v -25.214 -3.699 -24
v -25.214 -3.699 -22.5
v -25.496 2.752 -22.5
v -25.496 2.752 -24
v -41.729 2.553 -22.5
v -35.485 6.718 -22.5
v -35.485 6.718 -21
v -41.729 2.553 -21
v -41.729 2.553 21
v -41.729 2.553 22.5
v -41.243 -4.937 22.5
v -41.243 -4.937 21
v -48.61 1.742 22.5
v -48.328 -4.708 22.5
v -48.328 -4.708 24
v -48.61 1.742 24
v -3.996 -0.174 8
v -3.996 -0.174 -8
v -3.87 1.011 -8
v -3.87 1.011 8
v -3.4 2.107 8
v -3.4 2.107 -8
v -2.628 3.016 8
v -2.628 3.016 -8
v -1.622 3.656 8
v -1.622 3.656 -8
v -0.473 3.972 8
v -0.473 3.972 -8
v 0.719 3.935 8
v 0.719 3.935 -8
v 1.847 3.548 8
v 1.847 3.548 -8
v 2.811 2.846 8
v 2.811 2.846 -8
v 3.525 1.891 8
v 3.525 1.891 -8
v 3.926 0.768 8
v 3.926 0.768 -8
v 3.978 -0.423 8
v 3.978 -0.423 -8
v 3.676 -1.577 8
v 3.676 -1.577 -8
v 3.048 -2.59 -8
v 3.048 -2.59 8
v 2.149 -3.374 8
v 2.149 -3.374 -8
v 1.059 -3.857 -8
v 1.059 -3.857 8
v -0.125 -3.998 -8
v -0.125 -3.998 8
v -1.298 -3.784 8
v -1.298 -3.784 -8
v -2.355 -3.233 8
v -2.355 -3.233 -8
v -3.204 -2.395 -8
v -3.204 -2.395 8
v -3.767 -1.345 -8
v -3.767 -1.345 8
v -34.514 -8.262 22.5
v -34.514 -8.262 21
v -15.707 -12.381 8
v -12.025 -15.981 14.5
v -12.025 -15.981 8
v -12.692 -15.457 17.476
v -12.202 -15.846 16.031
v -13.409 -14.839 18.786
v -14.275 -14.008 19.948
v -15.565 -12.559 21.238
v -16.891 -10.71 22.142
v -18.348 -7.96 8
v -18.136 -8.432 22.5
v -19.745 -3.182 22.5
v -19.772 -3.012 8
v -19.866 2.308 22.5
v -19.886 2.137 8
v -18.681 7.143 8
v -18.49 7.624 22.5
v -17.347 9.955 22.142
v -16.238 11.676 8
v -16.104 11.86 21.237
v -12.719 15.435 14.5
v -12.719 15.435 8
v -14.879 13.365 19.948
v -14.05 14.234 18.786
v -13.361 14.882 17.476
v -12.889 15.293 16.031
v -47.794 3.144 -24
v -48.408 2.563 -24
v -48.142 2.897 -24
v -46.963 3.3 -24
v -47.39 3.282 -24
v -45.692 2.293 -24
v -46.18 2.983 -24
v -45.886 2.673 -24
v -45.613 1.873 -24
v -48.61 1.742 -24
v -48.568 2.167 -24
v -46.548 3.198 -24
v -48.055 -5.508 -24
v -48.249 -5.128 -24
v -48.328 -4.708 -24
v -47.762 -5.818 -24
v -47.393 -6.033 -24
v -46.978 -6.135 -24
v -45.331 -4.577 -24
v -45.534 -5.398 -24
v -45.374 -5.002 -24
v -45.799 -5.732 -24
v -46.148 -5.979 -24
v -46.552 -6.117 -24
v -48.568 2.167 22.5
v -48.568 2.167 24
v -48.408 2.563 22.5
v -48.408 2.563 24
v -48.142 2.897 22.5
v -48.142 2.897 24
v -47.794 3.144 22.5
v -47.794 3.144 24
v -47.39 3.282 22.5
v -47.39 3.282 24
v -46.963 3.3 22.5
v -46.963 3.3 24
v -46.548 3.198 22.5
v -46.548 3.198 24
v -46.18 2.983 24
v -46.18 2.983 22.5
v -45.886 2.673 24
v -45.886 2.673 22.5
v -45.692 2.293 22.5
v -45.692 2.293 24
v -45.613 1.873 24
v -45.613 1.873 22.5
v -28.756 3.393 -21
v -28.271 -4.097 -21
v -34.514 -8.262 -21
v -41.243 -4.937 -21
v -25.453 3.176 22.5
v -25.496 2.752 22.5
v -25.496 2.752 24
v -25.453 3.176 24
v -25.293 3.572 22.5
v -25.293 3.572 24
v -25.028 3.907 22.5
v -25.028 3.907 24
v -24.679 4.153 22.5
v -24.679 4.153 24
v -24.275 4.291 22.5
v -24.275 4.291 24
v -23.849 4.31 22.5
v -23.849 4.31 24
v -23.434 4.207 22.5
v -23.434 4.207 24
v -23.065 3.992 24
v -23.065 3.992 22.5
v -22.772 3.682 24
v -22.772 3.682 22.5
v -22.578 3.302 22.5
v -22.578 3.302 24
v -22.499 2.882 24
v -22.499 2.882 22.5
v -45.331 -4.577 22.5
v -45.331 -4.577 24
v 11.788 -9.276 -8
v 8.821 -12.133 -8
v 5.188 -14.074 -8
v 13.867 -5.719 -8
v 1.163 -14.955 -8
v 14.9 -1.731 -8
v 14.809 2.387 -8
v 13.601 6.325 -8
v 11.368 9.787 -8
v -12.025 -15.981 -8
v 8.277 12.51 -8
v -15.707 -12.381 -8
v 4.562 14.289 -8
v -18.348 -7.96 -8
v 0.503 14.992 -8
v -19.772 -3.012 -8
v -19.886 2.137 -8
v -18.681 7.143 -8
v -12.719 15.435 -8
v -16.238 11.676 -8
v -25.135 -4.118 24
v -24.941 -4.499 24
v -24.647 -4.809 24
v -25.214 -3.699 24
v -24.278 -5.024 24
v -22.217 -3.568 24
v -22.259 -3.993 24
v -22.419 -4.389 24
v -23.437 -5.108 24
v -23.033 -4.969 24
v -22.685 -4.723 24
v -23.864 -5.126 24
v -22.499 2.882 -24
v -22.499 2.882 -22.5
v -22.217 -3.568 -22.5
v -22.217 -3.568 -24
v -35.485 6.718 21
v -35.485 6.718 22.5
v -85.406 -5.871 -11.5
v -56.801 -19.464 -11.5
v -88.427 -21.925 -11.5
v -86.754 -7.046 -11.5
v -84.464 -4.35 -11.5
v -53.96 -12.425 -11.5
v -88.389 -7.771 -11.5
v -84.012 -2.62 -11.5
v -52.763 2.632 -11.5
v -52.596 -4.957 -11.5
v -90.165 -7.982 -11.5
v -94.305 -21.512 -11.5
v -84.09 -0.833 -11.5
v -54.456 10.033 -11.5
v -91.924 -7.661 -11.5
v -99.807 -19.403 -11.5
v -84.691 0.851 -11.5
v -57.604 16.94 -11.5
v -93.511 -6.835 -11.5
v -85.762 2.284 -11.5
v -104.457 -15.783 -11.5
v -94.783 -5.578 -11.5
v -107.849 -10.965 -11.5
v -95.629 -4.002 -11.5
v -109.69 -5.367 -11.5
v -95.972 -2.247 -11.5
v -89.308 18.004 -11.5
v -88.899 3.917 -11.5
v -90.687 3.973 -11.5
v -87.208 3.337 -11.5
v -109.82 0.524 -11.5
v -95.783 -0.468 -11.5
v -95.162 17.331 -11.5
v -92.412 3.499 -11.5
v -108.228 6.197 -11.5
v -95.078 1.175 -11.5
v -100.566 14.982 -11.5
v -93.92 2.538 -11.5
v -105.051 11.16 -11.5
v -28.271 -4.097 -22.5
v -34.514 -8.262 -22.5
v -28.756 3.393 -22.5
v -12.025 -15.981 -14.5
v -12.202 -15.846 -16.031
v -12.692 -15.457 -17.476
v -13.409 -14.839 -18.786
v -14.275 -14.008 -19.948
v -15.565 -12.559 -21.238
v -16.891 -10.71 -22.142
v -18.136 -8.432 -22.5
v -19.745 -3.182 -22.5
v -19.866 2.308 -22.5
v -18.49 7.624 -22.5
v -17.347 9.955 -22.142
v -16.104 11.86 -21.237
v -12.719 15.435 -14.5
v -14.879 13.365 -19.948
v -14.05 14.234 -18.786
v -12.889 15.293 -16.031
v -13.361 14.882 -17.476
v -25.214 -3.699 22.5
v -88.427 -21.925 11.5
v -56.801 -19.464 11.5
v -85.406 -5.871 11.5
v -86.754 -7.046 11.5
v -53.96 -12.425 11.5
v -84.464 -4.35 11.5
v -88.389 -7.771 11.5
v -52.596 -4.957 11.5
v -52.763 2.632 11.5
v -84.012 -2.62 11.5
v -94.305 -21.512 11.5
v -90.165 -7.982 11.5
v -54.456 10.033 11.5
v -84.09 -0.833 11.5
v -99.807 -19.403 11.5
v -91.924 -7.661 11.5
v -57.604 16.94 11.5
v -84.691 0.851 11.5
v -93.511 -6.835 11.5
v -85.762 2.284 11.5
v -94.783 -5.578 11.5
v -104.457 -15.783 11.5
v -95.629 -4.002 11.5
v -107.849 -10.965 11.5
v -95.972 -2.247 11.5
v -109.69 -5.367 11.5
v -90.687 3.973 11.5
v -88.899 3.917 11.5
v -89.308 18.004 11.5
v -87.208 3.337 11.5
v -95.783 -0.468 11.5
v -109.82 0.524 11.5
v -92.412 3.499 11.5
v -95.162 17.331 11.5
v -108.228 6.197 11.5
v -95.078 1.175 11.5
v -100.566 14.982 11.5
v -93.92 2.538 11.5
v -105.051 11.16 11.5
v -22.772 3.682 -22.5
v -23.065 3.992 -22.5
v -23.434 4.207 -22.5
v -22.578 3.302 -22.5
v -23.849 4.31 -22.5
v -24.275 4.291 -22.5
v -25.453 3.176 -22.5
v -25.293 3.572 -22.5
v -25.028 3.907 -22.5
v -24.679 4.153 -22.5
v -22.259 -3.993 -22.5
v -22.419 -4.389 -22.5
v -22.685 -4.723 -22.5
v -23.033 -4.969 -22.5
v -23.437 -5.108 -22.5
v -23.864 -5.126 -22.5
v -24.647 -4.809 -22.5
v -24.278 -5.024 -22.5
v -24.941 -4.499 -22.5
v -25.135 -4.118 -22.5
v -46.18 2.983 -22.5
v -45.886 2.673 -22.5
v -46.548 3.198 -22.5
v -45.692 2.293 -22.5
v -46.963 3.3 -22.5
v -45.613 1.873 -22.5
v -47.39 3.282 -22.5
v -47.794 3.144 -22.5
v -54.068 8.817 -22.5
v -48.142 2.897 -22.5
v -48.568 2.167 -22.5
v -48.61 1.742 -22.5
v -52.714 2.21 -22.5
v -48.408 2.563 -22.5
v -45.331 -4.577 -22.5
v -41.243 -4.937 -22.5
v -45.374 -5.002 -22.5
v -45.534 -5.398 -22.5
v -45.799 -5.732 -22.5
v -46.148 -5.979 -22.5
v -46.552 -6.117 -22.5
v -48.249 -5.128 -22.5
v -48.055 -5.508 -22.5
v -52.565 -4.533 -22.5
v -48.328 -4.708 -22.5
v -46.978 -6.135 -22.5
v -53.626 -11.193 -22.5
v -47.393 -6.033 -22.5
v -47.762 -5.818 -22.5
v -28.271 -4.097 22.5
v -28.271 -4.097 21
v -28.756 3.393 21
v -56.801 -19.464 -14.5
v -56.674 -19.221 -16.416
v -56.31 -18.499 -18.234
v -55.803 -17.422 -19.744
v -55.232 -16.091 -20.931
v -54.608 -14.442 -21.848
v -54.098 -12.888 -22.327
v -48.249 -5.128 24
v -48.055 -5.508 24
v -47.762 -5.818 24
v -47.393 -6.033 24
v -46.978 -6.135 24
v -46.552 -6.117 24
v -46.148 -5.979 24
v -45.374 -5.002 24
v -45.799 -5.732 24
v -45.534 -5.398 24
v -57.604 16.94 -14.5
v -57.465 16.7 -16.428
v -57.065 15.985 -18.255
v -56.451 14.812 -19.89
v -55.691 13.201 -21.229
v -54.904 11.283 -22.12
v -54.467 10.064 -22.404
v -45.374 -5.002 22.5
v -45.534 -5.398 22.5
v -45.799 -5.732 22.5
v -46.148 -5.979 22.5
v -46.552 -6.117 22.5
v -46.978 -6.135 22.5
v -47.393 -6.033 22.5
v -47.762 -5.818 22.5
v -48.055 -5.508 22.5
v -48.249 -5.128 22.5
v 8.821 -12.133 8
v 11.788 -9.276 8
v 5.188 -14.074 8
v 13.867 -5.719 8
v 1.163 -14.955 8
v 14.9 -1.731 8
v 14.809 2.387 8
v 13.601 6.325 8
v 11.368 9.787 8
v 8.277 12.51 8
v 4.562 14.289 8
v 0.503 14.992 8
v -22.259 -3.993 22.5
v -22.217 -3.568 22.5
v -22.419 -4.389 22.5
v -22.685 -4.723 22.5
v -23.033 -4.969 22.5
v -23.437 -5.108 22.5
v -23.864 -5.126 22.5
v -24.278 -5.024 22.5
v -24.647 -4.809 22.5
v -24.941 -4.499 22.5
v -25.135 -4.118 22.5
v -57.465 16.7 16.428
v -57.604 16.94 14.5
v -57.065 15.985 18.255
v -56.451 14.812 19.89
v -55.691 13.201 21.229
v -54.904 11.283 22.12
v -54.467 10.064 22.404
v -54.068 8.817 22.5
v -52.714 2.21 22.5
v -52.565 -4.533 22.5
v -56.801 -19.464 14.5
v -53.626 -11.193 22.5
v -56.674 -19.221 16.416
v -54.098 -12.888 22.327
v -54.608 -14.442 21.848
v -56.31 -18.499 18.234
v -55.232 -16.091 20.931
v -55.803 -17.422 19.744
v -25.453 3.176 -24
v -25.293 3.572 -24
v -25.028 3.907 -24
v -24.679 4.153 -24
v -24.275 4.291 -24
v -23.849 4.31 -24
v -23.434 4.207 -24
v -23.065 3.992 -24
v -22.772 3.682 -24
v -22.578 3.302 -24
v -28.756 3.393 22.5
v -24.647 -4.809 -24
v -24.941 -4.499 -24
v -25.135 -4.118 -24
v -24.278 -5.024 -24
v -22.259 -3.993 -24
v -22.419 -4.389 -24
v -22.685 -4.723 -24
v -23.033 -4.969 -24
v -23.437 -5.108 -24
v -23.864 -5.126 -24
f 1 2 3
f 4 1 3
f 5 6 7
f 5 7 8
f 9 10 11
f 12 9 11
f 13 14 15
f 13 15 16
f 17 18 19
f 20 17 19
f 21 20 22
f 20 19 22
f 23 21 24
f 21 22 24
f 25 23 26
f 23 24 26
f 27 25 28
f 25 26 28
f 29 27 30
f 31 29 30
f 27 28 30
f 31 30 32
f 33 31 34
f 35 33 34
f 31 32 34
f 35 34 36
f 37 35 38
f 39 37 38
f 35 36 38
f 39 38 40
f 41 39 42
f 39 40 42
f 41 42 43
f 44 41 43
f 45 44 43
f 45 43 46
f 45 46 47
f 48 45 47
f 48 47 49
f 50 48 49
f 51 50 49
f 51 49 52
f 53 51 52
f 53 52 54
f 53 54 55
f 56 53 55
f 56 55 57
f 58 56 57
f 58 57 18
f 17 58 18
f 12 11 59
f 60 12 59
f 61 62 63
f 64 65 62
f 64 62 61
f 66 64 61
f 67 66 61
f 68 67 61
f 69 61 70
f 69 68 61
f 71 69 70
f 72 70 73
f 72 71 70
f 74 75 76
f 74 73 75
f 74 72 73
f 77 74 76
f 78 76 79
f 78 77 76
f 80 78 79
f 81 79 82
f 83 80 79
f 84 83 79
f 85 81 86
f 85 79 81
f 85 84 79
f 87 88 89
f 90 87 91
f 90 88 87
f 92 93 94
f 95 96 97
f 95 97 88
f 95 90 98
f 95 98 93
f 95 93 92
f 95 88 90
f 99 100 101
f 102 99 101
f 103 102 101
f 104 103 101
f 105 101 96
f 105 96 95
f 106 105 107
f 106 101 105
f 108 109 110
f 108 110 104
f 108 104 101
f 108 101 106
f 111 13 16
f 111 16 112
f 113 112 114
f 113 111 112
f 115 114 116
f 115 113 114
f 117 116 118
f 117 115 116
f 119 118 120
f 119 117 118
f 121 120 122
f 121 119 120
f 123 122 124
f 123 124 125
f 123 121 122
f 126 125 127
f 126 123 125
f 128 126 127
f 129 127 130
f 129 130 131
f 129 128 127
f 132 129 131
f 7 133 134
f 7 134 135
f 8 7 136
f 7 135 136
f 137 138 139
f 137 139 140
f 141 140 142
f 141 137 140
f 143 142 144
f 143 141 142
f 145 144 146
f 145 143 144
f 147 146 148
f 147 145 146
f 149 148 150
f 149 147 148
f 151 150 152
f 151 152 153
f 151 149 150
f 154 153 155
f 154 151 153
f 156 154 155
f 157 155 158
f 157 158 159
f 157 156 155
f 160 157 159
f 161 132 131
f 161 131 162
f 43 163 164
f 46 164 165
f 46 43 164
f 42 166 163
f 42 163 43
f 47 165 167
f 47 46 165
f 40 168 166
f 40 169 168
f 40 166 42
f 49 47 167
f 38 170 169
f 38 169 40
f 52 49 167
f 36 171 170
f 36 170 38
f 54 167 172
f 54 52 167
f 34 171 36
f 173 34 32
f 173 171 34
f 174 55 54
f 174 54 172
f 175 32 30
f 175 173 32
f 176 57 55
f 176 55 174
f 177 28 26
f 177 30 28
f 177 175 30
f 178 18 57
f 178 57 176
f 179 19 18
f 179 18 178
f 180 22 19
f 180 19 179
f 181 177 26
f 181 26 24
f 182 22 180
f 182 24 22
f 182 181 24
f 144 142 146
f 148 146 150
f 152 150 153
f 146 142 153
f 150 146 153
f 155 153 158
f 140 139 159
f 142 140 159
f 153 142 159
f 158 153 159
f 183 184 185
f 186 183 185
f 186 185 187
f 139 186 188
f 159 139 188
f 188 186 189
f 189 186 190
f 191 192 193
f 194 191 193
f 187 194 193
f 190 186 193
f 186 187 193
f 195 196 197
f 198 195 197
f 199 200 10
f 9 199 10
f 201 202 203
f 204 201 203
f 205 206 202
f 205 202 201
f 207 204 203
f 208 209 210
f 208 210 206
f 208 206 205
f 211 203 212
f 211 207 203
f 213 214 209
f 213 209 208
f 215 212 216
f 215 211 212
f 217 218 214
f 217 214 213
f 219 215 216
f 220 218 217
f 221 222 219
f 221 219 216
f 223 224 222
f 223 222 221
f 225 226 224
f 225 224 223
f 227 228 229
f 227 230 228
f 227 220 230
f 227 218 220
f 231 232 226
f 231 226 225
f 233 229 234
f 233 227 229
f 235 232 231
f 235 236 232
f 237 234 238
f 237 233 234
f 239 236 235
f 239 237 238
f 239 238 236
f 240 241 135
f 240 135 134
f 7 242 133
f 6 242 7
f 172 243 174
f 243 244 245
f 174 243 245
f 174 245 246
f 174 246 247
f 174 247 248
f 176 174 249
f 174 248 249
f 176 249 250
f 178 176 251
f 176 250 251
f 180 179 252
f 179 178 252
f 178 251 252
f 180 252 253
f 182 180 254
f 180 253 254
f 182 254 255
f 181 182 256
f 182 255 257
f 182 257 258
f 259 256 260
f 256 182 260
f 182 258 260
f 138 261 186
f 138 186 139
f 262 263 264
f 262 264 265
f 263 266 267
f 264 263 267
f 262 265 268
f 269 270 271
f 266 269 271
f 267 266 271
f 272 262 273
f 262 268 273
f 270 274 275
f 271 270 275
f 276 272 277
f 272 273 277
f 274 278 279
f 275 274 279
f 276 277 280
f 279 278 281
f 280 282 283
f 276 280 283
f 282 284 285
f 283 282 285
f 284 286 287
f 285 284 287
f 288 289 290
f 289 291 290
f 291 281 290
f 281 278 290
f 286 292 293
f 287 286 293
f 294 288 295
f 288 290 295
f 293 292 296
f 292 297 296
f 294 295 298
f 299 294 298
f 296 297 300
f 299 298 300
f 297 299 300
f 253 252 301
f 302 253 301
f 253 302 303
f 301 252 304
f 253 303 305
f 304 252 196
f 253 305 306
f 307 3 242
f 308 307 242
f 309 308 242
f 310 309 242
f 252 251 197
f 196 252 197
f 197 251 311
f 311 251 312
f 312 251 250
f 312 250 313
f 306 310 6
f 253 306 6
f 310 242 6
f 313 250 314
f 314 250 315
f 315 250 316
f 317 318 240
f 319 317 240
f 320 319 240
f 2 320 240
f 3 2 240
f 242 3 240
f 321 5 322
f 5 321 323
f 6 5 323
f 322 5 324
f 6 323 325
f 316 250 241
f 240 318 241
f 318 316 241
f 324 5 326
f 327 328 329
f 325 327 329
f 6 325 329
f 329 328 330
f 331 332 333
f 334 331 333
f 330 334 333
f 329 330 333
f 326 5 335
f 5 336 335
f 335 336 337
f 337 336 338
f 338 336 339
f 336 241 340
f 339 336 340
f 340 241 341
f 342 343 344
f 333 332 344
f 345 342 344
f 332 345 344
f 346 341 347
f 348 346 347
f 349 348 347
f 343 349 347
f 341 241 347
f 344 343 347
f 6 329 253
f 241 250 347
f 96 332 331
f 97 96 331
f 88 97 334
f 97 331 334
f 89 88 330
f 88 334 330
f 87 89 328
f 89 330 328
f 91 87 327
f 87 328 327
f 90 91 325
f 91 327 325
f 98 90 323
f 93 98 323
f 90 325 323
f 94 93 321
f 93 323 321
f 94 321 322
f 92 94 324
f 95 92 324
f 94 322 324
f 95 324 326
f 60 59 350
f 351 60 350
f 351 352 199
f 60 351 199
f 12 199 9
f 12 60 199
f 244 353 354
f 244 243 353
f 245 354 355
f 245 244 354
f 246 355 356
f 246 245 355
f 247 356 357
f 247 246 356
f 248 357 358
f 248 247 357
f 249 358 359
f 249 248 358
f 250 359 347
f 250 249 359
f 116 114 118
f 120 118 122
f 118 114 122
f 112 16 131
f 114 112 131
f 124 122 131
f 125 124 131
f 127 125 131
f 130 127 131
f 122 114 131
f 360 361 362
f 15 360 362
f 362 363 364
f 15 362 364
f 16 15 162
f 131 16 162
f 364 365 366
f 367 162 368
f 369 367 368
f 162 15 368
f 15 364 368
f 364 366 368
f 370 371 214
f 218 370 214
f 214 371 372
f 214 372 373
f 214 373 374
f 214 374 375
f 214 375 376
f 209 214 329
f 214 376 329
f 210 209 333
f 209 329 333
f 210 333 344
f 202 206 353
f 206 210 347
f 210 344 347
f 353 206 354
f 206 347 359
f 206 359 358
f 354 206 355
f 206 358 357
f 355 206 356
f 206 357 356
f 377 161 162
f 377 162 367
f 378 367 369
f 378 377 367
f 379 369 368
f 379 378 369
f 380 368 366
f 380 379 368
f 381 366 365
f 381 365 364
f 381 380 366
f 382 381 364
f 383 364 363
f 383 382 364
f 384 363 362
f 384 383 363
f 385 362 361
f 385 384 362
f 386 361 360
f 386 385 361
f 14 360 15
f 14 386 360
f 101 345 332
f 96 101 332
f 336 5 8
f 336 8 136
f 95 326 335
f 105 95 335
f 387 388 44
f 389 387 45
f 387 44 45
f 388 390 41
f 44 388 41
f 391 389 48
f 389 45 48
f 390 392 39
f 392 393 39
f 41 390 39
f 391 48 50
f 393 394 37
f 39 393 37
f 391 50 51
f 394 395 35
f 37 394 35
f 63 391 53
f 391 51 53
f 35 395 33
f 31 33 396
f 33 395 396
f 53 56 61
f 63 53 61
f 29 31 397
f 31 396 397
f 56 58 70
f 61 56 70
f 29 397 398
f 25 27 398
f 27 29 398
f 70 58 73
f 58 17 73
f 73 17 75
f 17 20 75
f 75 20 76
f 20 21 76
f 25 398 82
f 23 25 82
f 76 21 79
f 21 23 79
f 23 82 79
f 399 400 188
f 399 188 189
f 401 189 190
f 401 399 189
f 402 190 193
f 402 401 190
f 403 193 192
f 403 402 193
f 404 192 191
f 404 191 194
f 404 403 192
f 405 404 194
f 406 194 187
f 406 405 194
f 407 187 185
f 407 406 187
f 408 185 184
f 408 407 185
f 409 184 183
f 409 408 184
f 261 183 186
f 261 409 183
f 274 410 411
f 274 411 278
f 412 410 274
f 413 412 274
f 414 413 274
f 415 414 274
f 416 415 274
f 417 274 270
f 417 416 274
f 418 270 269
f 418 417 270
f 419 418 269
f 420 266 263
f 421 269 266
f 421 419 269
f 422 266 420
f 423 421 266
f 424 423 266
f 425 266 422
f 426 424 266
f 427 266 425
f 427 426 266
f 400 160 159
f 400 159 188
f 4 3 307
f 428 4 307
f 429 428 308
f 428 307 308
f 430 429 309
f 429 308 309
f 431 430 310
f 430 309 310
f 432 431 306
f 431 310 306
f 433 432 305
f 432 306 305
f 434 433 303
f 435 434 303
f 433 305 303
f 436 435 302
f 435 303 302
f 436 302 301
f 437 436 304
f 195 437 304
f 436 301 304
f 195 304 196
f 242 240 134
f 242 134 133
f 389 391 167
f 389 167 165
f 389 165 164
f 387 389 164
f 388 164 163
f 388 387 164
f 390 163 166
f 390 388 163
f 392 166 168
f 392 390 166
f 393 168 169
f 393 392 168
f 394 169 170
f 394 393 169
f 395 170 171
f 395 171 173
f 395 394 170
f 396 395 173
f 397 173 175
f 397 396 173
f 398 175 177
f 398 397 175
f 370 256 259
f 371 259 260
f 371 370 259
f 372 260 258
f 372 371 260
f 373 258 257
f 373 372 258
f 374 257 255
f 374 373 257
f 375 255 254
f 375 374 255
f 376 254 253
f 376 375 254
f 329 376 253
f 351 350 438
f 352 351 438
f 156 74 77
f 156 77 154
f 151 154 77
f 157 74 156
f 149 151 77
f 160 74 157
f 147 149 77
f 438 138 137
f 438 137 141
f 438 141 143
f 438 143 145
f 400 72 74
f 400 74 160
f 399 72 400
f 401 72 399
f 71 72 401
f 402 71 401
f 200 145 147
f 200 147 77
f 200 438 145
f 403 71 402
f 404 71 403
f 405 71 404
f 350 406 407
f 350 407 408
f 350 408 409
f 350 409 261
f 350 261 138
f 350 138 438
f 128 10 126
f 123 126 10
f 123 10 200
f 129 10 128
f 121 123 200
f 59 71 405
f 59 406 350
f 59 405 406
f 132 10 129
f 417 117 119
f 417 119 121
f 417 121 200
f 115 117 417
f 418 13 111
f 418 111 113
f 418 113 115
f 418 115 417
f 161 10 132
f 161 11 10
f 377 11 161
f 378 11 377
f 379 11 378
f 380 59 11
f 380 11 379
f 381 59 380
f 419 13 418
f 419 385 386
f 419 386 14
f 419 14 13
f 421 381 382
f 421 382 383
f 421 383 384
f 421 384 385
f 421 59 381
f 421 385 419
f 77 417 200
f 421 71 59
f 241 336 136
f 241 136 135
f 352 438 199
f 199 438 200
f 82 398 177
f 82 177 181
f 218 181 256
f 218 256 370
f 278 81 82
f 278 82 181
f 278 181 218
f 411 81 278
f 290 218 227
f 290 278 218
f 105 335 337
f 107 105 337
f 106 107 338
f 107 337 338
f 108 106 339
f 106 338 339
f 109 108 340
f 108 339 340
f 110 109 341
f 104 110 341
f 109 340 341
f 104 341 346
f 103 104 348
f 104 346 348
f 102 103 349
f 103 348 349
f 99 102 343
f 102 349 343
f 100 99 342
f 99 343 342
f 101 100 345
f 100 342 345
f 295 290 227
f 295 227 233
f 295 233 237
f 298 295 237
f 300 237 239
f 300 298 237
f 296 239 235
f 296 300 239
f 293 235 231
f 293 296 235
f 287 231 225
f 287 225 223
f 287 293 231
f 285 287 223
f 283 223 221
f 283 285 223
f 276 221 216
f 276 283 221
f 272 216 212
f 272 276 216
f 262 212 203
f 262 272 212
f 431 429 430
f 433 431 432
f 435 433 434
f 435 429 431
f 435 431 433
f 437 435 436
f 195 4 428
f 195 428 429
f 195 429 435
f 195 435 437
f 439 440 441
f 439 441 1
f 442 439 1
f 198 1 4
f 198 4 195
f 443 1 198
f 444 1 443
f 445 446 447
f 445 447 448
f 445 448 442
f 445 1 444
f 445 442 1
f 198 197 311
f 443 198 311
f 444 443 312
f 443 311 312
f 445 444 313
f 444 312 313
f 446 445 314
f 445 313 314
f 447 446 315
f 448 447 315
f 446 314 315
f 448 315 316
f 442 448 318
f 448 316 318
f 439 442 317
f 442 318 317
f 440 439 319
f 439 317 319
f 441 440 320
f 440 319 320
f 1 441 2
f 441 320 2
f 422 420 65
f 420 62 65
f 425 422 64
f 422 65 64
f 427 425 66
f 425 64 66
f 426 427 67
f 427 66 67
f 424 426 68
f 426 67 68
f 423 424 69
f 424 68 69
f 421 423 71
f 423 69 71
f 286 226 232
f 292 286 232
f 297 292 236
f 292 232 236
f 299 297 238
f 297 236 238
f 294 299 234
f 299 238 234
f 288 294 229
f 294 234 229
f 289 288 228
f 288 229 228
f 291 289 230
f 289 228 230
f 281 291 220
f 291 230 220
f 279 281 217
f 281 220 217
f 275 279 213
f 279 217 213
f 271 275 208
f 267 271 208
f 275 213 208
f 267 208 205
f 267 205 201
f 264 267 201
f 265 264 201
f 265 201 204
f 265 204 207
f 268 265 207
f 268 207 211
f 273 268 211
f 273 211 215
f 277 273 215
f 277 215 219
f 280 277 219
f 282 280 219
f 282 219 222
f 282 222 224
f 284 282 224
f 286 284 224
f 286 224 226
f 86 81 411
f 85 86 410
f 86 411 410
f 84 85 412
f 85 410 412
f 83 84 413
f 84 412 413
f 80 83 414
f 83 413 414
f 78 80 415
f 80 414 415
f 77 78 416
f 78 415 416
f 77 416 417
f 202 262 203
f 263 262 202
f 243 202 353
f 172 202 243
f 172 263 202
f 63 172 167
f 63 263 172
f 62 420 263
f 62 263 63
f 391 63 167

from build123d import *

# Parameters (mm, degrees)
BOSS_EXTRUDE1_DEPTH    = 22.5
SKETCH2_R              = 37.5
SKETCH2_R_2            = 20
CUT_EXTRUDE1_DEPTH     = 11
FILLET1_R              = 8
SKETCH4_R              = 6
SKETCH4_R_2            = 4
CUT_EXTRUDE2_DEPTH     = 40
CUT_EXTRUDE3_DEPTH     = 1.5
BOSS_EXTRUDE2_DEPTH    = 1.5
SKETCH7_R              = 20
CUT_EXTRUDE4_DEPTH     = 3.5
BODY_MOVE_COPY7_ANGLE  = 178.232303169
BODY_MOVE_COPY8_ANGLE  = 1.26
BODY_MOVE_COPY9_ANGLE  = 1.26
BODY_MOVE_COPY10_ANGLE = 180


with BuildPart() as part:
    # Sketch1 → Boss-Extrude1 (new body, symmetric)
    with BuildSketch(Plane(origin=(0, 0, 0), x_dir=(1, 0, 0), z_dir=(0, 1, 0))):
        with BuildLine():
            Line((-91.135271219, -13.013928685), (-1.541618241, -19.940496814))
            ThreePointArc((-1.541618241, -19.940496814), (19.99534612, -0.431431984), (-0.680086883, 19.988433701))
            Line((-0.680086883, 19.988433701), (-90.489122701, 16.932769202))
            ThreePointArc((-90.489122701, 16.932769202), (-104.975567128, 2.265017913), (-91.135271219, -13.013928685))
        make_face()
    extrude(amount=BOSS_EXTRUDE1_DEPTH, both=True)

    # Sketch2 → Cut-Extrude1 (cut)
    with BuildSketch(Plane.XZ.offset(22.5)):
        Circle(SKETCH2_R)
        with Locations((-89.979057538, -1.941443926)):
            Circle(SKETCH2_R_2)
    cut_extrude1 = extrude(amount=-CUT_EXTRUDE1_DEPTH, mode=Mode.SUBTRACT)

    # Mirror1: Cut-Extrude1 across plane
    add(cut_extrude1.mirror(Plane(origin=(0, 0, 0), x_dir=(0, 0, 1), z_dir=(0, -1, 0))), mode=Mode.SUBTRACT)

    # Fillet1
    fillet1_edges = [part.edges().sort_by_distance(p)[0] for p in [
        (-55.557279033, -22.5, 15.764496148),
        (-54.825601141, -22.5, -18.1461856),
        (-54.825601141, 22.5, -18.1461856),
        (-55.557279033, 22.5, 15.764496148),
    ]]
    fillet(fillet1_edges, radius=FILLET1_R)

    # Sketch4 → Cut-Extrude2 (cut)
    with BuildSketch(Plane.XZ.offset(11.5)):
        Circle(SKETCH4_R)
        with Locations((-89.979057538, -1.941443926)):
            Circle(SKETCH4_R_2)
    extrude(amount=-CUT_EXTRUDE2_DEPTH, mode=Mode.SUBTRACT)

    # Sketch5 → Cut-Extrude3 (cut)
    with BuildSketch(Plane(origin=(0, 22.5, 0), x_dir=(1, 0, 0), z_dir=(0, 1, 0))):
        Polygon((-61.556626556, 4.801358237), (-61.398607028, -2.702531632), (-54.82103801, -6.31762764), (-48.401488521, -2.42883378), (-48.559508049, 5.075056088), (-55.137077066, 8.690152097), align=None)
    cut_extrude3 = extrude(amount=-CUT_EXTRUDE3_DEPTH, mode=Mode.SUBTRACT)

    # Sketch6 → Boss-Extrude2 (add)
    with BuildSketch(Plane(origin=(0, 22.5, 0), x_dir=(1, 0, 0), z_dir=(0, 1, 0))):
        with BuildLine():
            Line((-67.627696069, -1.919544043), (-67.627696069, 4.537052574))
            ThreePointArc((-67.627696069, 4.537052574), (-66.127696069, 6.037052574), (-64.627696069, 4.537052574))
            Line((-64.627696069, 4.537052574), (-64.627696069, -1.919544043))
            ThreePointArc((-64.627696069, -1.919544043), (-66.127696069, -3.419544043), (-67.627696069, -1.919544043))
        make_face()
        with BuildLine():
            Line((-44.491273974, -1.919544043), (-44.491273974, 4.537052574))
            ThreePointArc((-44.491273974, 4.537052574), (-42.991273974, 6.037052574), (-41.491273974, 4.537052574))
            Line((-41.491273974, 4.537052574), (-41.491273974, -1.919544043))
            ThreePointArc((-41.491273974, -1.919544043), (-42.991273974, -3.419544043), (-44.491273974, -1.919544043))
        make_face()
    boss_extrude2 = extrude(amount=BOSS_EXTRUDE2_DEPTH)

    # Mirror2: Cut-Extrude3, Boss-Extrude2 across plane
    add(cut_extrude3.mirror(Plane(origin=(0, 0, 0), x_dir=(0, 0, 1), z_dir=(0, -1, 0))), mode=Mode.SUBTRACT)
    add(boss_extrude2.mirror(Plane(origin=(0, 0, 0), x_dir=(0, 0, 1), z_dir=(0, -1, 0))))

    # Sketch7 → Cut-Extrude4 (cut)
    with BuildSketch(Plane.XZ.offset(11.5)):
        with Locations((-89.979057538, -1.941443926)):
            Circle(SKETCH7_R)
    cut_extrude4 = extrude(amount=-CUT_EXTRUDE4_DEPTH, mode=Mode.SUBTRACT)

    # Mirror3: Cut-Extrude4 across plane
    add(cut_extrude4.mirror(Plane.ZX), mode=Mode.SUBTRACT)


with BuildPart() as part_1:
    # Body-Move/Copy1: moved
    add(part.part.moved(Location((89.979057538, 0, 1.941443926))))


with BuildPart() as part_2:
    # Body-Move/Copy7: moved
    add(part_1.part.rotate(Axis((0, 0, 0), (-0.015427289, -0.70702263, 0.70702263)), BODY_MOVE_COPY7_ANGLE))


with BuildPart() as part_3:
    # Body-Move/Copy8: moved
    add(part_2.part.rotate(Axis((0, 0, 0), (0, 0, -1)), BODY_MOVE_COPY8_ANGLE))


with BuildPart() as part_4:
    # Body-Move/Copy9: moved
    add(part_3.part.rotate(Axis((0, 0, 0), (0, 0, 1)), BODY_MOVE_COPY9_ANGLE))


with BuildPart() as part_5:
    # Body-Move/Copy10: moved
    add(part_4.part.rotate(Axis((0, 0, 0), (1, 0, 0)), BODY_MOVE_COPY10_ANGLE))


solid = part_5.part
